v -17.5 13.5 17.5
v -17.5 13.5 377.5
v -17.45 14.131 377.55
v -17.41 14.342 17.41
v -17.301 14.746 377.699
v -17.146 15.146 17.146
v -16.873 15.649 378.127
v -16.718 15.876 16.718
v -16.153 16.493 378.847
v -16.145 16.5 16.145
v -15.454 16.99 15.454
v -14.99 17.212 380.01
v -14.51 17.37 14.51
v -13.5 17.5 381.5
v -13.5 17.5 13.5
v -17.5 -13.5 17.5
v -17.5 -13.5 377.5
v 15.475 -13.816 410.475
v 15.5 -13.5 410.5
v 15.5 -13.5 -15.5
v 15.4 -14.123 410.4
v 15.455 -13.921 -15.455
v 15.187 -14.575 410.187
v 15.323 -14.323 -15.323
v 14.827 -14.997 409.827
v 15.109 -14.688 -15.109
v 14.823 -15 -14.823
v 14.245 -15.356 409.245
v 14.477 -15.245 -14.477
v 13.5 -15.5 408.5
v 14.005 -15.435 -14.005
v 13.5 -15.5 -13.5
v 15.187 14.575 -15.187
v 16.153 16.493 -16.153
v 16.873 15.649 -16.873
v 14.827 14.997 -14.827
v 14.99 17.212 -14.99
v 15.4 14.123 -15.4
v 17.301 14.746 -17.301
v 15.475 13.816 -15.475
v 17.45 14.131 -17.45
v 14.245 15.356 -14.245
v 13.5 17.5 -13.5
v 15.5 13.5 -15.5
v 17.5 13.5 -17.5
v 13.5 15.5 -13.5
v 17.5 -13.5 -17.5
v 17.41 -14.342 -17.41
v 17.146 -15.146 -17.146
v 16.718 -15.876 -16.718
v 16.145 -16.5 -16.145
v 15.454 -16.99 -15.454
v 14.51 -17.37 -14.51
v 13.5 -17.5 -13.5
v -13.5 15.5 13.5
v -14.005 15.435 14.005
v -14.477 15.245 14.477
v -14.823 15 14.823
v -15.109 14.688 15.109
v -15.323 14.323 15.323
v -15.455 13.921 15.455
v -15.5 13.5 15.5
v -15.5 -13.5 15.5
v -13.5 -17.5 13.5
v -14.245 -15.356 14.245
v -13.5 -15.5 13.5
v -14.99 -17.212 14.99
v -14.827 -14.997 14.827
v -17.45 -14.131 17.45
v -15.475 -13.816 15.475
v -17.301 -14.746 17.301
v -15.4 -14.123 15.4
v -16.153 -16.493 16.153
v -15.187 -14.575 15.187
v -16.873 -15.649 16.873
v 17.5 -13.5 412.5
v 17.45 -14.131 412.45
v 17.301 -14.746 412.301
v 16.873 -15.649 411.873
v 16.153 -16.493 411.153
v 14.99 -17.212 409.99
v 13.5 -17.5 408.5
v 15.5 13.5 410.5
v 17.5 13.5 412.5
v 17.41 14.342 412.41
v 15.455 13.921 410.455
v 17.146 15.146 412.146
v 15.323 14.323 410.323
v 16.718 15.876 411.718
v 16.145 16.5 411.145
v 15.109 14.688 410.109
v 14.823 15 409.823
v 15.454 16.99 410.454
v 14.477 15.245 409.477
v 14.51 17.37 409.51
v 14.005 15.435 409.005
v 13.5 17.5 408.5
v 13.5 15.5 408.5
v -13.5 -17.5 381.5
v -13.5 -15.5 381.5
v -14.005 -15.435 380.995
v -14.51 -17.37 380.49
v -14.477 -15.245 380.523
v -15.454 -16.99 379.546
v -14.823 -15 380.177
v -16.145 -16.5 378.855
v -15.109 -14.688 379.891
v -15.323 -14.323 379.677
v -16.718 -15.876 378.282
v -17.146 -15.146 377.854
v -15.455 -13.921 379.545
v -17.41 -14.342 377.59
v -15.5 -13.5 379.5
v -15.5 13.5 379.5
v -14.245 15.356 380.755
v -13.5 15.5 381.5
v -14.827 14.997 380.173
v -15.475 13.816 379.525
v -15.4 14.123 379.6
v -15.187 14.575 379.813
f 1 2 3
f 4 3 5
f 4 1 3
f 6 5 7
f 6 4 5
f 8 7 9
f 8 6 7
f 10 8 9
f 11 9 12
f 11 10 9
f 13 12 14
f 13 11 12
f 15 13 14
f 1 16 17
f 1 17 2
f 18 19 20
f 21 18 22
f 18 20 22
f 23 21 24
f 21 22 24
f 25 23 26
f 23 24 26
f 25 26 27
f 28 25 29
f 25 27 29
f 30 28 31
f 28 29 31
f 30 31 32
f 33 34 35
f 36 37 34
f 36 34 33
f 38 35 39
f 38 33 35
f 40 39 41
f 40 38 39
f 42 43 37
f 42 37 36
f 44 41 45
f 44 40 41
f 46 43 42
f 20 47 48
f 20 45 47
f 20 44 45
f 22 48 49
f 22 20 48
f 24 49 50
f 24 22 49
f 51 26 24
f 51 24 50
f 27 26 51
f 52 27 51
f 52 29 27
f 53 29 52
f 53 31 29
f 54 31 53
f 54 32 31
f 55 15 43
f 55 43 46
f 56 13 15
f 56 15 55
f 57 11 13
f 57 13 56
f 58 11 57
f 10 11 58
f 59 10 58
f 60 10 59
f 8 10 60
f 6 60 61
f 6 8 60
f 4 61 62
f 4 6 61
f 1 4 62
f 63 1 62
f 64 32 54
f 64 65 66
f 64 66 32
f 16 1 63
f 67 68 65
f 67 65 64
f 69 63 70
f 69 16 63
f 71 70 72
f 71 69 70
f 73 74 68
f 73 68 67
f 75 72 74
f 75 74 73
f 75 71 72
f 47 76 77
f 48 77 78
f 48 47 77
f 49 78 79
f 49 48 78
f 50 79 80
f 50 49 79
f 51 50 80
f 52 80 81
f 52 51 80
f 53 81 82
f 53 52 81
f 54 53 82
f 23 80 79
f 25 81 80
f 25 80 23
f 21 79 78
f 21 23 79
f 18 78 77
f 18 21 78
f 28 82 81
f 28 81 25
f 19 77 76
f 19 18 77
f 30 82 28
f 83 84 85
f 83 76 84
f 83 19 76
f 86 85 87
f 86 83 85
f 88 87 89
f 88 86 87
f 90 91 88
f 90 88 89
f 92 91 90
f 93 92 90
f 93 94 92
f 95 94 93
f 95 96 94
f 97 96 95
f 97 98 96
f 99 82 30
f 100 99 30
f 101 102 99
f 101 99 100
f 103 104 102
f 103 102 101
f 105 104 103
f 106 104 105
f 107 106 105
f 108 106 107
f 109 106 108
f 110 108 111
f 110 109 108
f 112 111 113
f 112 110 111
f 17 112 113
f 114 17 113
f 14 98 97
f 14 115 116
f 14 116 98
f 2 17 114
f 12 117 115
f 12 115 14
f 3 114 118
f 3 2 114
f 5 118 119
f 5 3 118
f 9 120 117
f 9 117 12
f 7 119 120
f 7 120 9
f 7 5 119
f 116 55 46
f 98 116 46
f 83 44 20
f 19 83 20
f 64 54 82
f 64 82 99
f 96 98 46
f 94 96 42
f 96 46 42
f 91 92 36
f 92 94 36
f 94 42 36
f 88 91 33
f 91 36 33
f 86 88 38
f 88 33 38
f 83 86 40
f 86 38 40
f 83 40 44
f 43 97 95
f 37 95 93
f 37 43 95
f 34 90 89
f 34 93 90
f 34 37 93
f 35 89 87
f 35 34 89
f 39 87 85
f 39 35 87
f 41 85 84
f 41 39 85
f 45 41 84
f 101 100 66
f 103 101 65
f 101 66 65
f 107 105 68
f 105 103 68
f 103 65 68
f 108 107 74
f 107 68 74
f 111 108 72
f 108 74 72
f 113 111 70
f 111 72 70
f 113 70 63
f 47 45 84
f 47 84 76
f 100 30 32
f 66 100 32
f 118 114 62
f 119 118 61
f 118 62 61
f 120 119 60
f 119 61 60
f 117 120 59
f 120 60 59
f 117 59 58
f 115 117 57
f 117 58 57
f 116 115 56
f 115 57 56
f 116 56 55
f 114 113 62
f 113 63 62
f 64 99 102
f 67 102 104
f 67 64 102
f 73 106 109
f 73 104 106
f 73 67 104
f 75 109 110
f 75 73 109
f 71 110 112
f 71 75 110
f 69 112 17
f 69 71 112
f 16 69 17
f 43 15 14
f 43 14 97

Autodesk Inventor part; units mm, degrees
ref_plane "Start plane" through (0, 0, -17.5) normal (0, 0, 1) x (1, 0, 0)
ref_plane "End plane" through (0, 0, 412.5) normal (0, 0, 1) x (1, 0, 0)
sketch "Sketch" plane through (0, 0, 0) normal (0, 0, 1) x (1, 0, 0)
  line L0 (-17.5, -13.5) -> (-17.5, 13.5)
  line L1 (-13.5, 17.5) -> (13.5, 17.5)
  line L2 (17.5, 13.5) -> (17.5, -13.5)
  line L3 (13.5, -17.5) -> (-13.5, -17.5)
  arc A0 (-17.5, -13.5) -> (-13.5, -17.5) centre (-13.5, -13.5) ccw
  arc A1 (-13.5, 17.5) -> (-17.5, 13.5) centre (-13.5, 13.5) ccw
  arc A2 (17.5, 13.5) -> (13.5, 17.5) centre (13.5, 13.5) ccw
  arc A3 (13.5, -17.5) -> (17.5, -13.5) centre (13.5, -13.5) ccw
  arc A4 (-13.5, 15.5) -> (-15.5, 13.5) centre (-13.5, 13.5) ccw
  line L4 (-13.5, 15.5) -> (13.5, 15.5)
  arc A5 (15.5, 13.5) -> (13.5, 15.5) centre (13.5, 13.5) ccw
  line L5 (15.5, 13.5) -> (15.5, -13.5)
  arc A6 (13.5, -15.5) -> (15.5, -13.5) centre (13.5, -13.5) ccw
  line L6 (13.5, -15.5) -> (-13.5, -15.5)
  arc A7 (-15.5, -13.5) -> (-13.5, -15.5) centre (-13.5, -13.5) ccw
  line L7 (-15.5, -13.5) -> (-15.5, 13.5)
  line L8 (0, 25.6598) -> (0, -25.6598) construction
  line L9 (-25.6598, 0) -> (25.6598, 0) construction
  dimension "d7" = 4
  dimension "d10" = 35
  dimension "d11" = 35
  dimension "d12" = 2
  dimension "d15" = 17.5
  dimension "d16" = 17.5
extrude "Body" add sketch "Sketch" along normal up to surface (430 mm away) from surface at -17.5
sketch "Sketch3" plane through (0, 0, 0) normal (0, 0, 1) x (1, 0, 0)
  line L0 (0, 0) -> (10, 0)
ref_plane "Work Plane3" through (0, 0, 0) normal (0, -1, 0) x (1, 0, 0)
sketch "Sketch4" plane through (0, 0, 0) normal (0, -1, 0) x (1, 0, 0)
  line L0 (-2, -17.5) -> (12, -17.5)
  line L1 (-2, 412.5) -> (12, 412.5)
  dimension "d18" = 430
ref_plane "Work Plane12" through (0, 180, -17.5) normal (0, 0, -1) x (-1, 0, 0)
split "Split6" plane through (0, 180, -17.5) removes the side toward (0, 0, -1)
ref_plane "Work Plane13" through (17.5, 0, -17.5) normal (-0.7071, 0, -0.7071) x (-0.7071, 0, 0.7071)
split "Split7" plane through (17.5, 0, -17.5) removes the side toward (-0.7071, 0, -0.7071)
ref_plane "Work Plane14" through (17.5, 0, 412.5) normal (-0.7071, 0, 0.7071) x (0.7071, 0, 0.7071)
split "Split8" plane through (17.5, 0, 412.5) removes the side toward (-0.7071, 0, 0.7071)
equation "\"d7\" = G_IR"
equation "\"d10\" = G_H"
equation "\"d11\" = G_W"
equation "\"d12\" = G_T"
equation "\"d15\" = 0.5 * d10"
equation "\"d16\" = 0.5 * d11"
equation "\"d3\" = G_L"
equation "\"G_W\" = 35"
equation "\"G_H\" = 35"
equation "\"G_T\" = 2"
equation "\"G_IR\" = 4"
equation "\"G_L\" = d18"
equation "\"G_OFFSET_START\" = 17.5"
equation "\"G_OFFSET_END\" = 17.5"
equation "\"d13\" = -G_OFFSET_START"
equation "\"d14\" = G_OFFSET_END + B_L"
equation "\"B_L\" = 395"
properties part number "AS 1163 - C350L0 35x35x2.0 SHS - 430" material "Steel, Mild"
